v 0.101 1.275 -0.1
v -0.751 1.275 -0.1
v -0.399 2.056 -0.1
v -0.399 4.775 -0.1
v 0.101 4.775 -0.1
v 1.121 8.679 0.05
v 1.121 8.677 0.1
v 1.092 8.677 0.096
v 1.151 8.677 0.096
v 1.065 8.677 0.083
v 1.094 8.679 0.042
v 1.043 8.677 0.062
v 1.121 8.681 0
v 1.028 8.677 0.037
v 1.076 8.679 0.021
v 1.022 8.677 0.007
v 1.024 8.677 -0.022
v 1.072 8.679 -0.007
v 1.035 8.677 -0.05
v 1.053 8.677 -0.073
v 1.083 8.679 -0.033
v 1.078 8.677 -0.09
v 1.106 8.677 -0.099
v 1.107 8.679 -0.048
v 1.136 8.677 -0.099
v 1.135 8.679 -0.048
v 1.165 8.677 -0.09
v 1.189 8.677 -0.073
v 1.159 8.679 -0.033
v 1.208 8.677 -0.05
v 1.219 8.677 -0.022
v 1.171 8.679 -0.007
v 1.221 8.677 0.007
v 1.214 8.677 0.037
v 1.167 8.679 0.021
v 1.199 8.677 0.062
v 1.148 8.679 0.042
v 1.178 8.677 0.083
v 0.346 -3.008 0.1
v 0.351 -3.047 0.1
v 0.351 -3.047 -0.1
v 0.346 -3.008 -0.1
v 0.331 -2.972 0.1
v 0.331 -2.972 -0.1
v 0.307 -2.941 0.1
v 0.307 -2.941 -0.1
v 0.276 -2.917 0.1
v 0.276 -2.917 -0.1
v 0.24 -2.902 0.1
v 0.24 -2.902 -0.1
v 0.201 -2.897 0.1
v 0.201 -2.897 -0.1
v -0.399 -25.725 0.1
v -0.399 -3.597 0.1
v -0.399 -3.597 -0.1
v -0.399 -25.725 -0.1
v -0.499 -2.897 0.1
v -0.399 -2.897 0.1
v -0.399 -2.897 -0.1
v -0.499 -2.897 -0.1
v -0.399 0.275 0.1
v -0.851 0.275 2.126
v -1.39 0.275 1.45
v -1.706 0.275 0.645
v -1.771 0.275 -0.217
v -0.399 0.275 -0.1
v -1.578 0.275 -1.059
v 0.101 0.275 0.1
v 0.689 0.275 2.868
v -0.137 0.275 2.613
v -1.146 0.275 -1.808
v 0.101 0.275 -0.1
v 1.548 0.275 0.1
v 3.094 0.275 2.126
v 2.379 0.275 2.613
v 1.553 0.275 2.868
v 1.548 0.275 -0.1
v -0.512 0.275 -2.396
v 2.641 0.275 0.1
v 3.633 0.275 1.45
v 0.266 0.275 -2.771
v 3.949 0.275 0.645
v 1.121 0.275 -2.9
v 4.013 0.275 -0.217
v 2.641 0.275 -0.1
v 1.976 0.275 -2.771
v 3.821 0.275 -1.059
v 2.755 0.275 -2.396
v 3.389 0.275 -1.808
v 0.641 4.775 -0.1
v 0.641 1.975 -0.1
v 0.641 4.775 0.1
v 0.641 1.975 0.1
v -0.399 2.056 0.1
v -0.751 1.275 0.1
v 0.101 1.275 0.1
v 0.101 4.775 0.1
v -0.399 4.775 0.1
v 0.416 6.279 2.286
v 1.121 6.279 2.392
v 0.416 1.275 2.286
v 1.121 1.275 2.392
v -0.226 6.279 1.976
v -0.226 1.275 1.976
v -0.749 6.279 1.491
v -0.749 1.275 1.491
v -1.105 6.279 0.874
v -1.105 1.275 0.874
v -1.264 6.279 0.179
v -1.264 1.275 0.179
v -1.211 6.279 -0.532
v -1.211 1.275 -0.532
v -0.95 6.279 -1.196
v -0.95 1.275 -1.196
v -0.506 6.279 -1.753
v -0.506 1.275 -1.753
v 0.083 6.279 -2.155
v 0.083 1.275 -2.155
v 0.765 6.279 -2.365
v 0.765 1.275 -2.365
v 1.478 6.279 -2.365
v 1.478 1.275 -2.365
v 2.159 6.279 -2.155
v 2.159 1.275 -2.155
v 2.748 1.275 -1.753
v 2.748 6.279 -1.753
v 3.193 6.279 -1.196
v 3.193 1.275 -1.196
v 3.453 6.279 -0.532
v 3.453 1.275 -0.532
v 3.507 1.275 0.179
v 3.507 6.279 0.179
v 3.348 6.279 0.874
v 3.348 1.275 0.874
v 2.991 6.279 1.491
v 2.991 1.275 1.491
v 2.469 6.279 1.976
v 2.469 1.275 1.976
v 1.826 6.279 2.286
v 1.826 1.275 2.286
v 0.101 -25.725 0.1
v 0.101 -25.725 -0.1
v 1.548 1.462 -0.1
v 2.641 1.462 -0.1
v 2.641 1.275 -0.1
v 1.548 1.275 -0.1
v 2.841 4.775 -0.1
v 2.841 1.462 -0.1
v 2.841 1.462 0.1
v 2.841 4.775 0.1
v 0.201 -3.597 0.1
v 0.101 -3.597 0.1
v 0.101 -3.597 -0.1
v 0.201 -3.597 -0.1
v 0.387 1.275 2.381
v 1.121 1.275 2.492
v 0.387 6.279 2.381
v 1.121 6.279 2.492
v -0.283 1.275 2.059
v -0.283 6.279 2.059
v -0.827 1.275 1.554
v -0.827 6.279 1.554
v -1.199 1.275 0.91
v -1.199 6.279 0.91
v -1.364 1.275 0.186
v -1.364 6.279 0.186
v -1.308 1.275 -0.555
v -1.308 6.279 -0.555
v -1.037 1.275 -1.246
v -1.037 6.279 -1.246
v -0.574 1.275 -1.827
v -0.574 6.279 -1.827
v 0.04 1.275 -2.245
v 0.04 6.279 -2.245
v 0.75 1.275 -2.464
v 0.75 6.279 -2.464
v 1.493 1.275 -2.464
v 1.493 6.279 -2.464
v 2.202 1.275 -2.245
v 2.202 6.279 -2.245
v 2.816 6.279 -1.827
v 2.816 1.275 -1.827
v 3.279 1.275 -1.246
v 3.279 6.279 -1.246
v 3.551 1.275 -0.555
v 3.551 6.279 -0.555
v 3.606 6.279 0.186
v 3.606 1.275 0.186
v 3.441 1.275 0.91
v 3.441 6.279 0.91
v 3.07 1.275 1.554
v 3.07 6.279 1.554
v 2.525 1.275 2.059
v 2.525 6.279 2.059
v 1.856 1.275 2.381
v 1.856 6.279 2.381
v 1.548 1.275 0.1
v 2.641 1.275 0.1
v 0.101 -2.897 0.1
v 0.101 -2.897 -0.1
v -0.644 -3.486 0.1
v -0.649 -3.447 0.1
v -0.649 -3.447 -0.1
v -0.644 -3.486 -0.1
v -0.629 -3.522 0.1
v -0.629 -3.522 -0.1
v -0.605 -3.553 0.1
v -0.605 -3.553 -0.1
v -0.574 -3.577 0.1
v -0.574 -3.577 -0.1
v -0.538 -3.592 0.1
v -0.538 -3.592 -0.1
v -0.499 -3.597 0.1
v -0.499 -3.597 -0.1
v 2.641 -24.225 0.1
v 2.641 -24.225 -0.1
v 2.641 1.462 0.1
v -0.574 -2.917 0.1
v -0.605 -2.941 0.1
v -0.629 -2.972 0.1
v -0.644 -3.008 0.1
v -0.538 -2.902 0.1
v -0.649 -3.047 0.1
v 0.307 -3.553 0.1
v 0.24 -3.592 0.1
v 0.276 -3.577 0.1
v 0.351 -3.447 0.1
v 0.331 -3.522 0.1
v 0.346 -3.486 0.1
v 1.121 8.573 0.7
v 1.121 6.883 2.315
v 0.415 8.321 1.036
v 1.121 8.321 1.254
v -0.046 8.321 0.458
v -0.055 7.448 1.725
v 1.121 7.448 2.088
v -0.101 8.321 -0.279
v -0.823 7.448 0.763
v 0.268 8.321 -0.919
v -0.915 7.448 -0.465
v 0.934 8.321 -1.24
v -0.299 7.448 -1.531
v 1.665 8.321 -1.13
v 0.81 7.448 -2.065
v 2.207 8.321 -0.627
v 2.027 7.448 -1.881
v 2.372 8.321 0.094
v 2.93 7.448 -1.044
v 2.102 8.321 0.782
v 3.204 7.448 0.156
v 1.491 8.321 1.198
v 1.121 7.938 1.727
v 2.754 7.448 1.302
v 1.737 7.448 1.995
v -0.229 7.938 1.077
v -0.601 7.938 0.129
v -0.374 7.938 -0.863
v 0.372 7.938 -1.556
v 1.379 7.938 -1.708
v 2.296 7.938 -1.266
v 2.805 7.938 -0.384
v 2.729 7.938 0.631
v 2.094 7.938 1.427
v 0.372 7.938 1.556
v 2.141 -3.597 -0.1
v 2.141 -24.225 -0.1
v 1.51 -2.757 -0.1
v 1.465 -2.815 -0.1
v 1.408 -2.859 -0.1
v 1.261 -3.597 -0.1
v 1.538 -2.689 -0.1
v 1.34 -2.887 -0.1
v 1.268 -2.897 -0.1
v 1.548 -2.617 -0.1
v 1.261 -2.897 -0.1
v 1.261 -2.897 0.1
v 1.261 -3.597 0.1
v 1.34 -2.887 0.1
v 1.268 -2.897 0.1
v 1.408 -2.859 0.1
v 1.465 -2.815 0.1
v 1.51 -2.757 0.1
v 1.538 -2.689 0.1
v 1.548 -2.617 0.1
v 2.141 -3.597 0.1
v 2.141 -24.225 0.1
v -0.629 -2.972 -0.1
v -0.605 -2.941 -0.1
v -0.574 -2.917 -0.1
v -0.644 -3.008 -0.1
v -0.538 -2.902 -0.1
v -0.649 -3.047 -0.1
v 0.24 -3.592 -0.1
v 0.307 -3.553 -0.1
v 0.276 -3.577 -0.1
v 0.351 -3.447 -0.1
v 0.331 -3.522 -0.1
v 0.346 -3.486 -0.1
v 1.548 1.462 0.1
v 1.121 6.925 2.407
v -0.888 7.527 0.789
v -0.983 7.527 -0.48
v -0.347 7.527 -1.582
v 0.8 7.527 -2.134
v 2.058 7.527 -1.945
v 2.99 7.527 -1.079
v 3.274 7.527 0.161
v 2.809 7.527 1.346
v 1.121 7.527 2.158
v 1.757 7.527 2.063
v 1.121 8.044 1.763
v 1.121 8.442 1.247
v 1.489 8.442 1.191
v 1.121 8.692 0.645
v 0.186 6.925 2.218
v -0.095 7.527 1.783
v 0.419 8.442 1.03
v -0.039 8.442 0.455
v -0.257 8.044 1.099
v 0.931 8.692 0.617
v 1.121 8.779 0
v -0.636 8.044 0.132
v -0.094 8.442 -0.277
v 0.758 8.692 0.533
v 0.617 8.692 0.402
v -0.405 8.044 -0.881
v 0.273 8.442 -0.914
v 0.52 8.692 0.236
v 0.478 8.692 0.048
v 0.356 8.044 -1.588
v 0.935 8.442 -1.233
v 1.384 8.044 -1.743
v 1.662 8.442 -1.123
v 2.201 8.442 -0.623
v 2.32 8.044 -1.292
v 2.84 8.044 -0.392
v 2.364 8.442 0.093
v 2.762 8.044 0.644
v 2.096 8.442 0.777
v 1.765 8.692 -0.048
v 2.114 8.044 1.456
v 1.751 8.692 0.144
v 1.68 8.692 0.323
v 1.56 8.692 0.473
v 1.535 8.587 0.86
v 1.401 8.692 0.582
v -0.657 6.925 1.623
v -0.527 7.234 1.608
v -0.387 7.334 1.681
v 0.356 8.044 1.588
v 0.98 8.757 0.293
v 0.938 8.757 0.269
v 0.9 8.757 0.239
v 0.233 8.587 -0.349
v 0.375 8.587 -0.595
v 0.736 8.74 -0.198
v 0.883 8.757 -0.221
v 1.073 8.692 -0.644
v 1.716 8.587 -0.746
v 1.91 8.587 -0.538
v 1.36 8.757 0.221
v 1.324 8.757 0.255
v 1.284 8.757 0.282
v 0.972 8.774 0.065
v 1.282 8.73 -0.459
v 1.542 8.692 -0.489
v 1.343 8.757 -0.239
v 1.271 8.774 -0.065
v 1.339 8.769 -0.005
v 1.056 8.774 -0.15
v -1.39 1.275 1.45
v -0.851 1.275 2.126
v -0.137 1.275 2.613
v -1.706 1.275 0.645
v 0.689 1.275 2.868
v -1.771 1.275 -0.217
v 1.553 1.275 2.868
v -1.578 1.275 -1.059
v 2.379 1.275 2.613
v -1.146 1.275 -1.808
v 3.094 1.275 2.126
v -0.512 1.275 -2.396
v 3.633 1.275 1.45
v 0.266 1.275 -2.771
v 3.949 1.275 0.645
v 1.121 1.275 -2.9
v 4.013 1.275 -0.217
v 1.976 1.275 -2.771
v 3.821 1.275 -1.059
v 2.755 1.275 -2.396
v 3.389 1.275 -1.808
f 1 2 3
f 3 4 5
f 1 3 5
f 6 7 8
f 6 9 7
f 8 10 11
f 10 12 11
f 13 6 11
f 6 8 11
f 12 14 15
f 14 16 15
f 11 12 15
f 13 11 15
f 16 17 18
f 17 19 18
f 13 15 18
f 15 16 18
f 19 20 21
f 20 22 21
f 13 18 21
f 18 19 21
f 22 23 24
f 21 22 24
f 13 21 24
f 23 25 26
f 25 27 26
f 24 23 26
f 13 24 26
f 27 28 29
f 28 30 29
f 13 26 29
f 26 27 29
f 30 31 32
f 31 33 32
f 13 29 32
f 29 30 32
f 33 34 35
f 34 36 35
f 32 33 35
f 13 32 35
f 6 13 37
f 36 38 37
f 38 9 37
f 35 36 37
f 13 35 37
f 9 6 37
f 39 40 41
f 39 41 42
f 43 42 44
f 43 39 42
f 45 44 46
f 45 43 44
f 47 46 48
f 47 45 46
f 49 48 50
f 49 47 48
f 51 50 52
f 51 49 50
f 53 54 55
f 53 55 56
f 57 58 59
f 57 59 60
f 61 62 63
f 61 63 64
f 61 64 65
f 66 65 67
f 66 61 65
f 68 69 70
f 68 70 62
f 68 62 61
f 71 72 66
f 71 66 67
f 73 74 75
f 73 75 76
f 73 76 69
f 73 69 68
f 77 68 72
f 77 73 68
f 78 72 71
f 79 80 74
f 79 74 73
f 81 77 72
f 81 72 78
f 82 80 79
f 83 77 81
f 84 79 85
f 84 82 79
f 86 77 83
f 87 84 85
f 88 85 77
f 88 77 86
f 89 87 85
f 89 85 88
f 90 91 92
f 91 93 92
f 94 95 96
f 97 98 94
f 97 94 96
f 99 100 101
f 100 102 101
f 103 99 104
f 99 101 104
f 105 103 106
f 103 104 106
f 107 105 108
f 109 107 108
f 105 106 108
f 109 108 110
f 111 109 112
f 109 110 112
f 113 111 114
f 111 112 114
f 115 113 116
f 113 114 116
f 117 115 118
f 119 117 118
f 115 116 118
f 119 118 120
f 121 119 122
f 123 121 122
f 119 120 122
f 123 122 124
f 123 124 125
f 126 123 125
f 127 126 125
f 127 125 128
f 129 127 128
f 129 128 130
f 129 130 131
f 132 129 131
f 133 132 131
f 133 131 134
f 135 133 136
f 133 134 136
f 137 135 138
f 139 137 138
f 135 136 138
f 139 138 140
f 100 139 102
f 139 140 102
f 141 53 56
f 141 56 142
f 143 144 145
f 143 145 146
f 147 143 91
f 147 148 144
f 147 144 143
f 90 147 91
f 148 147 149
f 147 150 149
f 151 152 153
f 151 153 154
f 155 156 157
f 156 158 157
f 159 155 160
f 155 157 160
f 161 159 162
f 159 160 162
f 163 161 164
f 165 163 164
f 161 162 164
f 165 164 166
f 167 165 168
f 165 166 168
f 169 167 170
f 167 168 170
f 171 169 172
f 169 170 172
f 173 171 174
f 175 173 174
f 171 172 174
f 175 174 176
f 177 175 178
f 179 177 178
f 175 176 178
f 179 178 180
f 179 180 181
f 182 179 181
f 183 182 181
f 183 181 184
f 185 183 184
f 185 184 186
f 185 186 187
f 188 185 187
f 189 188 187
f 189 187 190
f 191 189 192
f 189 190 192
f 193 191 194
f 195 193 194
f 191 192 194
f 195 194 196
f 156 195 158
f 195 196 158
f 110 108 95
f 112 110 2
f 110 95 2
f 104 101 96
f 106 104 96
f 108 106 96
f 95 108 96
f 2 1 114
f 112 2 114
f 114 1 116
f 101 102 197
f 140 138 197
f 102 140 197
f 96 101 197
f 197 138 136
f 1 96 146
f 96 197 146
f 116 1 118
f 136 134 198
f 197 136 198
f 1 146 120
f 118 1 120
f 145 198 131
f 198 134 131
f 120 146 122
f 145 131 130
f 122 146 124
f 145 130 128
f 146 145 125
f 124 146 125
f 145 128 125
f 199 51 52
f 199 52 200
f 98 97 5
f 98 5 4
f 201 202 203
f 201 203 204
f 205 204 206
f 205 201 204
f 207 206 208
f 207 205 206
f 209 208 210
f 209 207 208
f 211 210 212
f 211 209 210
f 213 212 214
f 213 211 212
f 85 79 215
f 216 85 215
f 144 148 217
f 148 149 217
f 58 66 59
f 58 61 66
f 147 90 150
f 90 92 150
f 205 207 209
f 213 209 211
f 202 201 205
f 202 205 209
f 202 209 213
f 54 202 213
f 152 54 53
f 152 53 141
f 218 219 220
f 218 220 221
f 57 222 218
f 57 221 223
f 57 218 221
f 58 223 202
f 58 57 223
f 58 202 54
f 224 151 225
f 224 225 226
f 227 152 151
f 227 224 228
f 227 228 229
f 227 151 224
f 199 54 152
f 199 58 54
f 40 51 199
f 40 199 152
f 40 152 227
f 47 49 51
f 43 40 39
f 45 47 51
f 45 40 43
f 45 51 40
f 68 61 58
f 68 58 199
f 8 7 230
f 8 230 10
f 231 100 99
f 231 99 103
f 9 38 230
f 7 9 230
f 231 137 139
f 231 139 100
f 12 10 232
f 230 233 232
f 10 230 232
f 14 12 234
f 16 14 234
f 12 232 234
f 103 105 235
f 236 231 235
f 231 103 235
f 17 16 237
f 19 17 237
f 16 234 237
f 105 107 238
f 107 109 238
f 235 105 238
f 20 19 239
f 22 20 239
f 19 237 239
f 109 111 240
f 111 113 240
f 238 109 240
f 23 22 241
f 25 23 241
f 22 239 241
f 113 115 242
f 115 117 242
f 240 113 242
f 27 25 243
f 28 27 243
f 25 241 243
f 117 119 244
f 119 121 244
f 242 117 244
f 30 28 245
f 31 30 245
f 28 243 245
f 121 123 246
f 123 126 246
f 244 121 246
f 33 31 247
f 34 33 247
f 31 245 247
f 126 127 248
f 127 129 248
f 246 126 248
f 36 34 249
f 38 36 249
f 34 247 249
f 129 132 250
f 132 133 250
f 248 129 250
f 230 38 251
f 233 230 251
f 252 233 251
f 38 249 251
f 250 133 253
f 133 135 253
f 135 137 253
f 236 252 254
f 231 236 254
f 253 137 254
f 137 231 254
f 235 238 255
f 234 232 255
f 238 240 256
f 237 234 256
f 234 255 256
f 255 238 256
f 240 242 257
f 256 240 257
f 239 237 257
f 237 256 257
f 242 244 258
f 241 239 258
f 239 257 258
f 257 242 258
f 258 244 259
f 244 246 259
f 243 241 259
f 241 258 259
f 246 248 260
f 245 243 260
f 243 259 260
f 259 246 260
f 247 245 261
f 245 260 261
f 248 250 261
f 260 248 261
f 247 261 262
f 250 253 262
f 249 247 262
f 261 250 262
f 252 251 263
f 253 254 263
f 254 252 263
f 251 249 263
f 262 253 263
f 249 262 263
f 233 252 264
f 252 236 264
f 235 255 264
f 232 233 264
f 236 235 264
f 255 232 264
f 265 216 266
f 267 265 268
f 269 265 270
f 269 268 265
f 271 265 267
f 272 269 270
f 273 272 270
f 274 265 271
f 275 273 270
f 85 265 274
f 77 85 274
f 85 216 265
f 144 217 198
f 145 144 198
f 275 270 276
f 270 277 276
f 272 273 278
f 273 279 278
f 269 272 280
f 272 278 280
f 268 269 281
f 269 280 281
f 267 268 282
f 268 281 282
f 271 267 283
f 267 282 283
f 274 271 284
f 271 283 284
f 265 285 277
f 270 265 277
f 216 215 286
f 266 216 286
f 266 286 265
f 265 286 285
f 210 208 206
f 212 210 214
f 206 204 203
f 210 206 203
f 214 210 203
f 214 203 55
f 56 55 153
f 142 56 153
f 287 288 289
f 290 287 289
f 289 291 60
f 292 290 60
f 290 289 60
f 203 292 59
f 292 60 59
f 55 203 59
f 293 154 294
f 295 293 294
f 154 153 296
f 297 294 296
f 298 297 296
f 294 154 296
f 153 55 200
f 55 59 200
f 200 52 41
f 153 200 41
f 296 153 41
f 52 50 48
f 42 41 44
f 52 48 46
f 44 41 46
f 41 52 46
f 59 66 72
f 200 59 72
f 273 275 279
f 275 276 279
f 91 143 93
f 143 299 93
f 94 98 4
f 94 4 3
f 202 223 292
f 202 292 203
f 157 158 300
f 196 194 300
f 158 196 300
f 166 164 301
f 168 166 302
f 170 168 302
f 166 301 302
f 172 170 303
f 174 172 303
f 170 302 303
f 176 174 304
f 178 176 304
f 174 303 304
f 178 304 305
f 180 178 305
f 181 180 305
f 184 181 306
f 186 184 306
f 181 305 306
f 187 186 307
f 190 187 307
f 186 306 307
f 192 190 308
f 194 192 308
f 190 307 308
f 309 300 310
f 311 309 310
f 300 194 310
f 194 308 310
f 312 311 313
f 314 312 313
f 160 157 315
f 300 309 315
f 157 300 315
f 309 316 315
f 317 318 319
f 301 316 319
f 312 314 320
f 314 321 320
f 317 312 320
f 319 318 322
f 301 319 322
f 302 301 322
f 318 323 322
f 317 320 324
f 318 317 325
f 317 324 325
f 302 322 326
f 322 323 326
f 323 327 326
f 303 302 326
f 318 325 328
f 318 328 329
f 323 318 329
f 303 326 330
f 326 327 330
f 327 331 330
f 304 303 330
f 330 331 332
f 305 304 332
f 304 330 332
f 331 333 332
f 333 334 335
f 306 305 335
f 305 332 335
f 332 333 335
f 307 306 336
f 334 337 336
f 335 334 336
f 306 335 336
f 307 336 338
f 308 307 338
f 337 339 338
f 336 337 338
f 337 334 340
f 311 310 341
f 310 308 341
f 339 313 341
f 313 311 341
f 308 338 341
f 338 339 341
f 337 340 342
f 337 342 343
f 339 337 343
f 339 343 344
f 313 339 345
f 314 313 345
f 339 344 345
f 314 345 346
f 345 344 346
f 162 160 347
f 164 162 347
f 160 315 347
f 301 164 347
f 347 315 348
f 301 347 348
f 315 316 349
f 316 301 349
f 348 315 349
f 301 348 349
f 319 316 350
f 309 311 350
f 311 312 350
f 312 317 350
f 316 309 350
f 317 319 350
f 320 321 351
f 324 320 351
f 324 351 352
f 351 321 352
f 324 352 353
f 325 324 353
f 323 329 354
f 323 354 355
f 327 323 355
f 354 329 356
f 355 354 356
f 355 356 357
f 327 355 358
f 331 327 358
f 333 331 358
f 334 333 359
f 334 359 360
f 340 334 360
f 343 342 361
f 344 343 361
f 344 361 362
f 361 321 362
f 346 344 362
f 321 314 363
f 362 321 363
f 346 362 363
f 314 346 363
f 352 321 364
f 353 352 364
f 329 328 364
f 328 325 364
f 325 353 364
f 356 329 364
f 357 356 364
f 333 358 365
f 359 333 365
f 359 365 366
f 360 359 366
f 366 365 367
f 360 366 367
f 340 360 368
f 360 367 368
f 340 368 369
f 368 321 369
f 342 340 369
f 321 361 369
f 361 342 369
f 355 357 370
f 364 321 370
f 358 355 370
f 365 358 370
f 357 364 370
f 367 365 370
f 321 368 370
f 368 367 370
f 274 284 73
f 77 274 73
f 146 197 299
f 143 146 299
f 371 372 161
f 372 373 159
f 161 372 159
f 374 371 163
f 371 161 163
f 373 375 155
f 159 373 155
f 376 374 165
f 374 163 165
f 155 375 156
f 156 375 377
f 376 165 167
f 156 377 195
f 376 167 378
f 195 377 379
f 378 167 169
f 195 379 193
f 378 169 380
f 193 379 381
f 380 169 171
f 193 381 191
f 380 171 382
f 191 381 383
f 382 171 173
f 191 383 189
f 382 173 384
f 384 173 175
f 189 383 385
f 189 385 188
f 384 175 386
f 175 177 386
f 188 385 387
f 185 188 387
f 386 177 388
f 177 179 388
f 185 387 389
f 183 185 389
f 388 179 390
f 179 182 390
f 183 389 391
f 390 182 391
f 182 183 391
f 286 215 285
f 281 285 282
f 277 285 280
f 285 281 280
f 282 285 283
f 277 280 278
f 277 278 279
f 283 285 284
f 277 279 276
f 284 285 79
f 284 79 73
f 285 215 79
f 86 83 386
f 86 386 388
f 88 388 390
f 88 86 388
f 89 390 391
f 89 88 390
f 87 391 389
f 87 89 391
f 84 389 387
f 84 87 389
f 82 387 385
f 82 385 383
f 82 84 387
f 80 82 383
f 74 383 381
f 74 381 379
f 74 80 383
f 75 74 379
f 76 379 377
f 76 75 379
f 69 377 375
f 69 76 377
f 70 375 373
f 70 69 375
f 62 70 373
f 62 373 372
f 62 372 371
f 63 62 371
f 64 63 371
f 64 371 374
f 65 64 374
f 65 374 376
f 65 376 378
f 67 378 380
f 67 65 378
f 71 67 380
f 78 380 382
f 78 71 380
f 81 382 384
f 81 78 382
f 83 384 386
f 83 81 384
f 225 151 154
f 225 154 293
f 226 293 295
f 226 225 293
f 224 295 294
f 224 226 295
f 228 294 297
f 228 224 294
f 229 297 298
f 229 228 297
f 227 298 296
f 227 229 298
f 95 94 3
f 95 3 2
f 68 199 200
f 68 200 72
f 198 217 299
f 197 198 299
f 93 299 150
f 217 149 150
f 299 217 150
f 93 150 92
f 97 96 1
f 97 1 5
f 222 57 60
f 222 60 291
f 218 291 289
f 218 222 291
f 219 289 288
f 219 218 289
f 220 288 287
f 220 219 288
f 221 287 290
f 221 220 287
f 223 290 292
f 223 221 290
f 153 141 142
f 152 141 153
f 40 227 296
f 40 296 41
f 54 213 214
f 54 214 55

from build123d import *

# Parameters (mm, degrees)
SALIENTE_EXTRUIR1_DEPTH   = 0.1
SALIENTE_EXTRUIR1_2_DEPTH = 0.1
CROQUIS7_R                = 2.9
SALIENTE_EXTRUIR2_DEPTH   = 1


with BuildPart() as part:
    # Croquis1 → Saliente-Extruir1 (new, symmetric)
    with BuildSketch(Plane.XY):
        with BuildLine():
            Line((2.141229394, -3.596955899), (1.261229394, -3.596955899))
            Line((1.261229394, -3.596955899), (1.261229394, -2.896955899))
            Line((1.261229394, -2.896955899), (1.267504118, -2.896955899))
            ThreePointArc((1.267504118, -2.896955899), (1.465494017, -2.814945798), (1.547504118, -2.616955899))
            Line((1.547504118, -2.616955899), (1.547504118, 0.274513326))
            Line((1.547504118, 0.274513326), (1.547504118, 1.461848277))
            Line((1.547504118, 1.461848277), (0.641229394, 1.974513326))
            Line((0.641229394, 1.974513326), (0.641229394, 4.774513326))
            Line((0.641229394, 4.774513326), (2.841229394, 4.774513326))
            Line((2.841229394, 4.774513326), (2.841229394, 1.461848277))
            Line((2.841229394, 1.461848277), (2.641229394, 1.461848277))
            Line((2.641229394, 1.461848277), (2.641229394, 0.274513326))
            Line((2.641229394, 0.274513326), (2.641229394, -24.225486674))
            Line((2.641229394, -24.225486674), (2.141229394, -24.225486674))
            Line((2.141229394, -24.225486674), (2.141229394, -3.596955899))
        make_face()
    extrude(amount=SALIENTE_EXTRUIR1_DEPTH, both=True)



with BuildPart() as body_2:
    # Croquis1 → Saliente-Extruir1 2 (new, symmetric)
    with BuildSketch(Plane.XY):
        with BuildLine():
            Line((-0.398770606, 0.274513326), (-0.398770606, -2.896955899))
            Line((-0.398770606, -2.896955899), (-0.498770606, -2.896955899))
            ThreePointArc((-0.498770606, -2.896955899), (-0.604836624, -2.940889882), (-0.648770606, -3.046955899))
            Line((-0.648770606, -3.046955899), (-0.648770606, -3.446955899))
            ThreePointArc((-0.648770606, -3.446955899), (-0.604836624, -3.553021917), (-0.498770606, -3.596955899))
            Line((-0.498770606, -3.596955899), (-0.398770606, -3.596955899))
            Line((-0.398770606, -3.596955899), (-0.398770606, -25.725486674))
            Line((-0.398770606, -25.725486674), (0.101229394, -25.725486674))
            Line((0.101229394, -25.725486674), (0.101229394, -3.596955899))
            Line((0.101229394, -3.596955899), (0.201229394, -3.596955899))
            ThreePointArc((0.201229394, -3.596955899), (0.307295411, -3.553021917), (0.351229394, -3.446955899))
            Line((0.351229394, -3.446955899), (0.351229394, -3.046955899))
            ThreePointArc((0.351229394, -3.046955899), (0.307295411, -2.940889882), (0.201229394, -2.896955899))
            Line((0.201229394, -2.896955899), (0.101229394, -2.896955899))
            Line((0.101229394, -2.896955899), (0.101229394, 0.274513326))
            Line((0.101229394, 0.274513326), (0.101229394, 4.774513326))
            Line((0.101229394, 4.774513326), (-0.398770606, 4.774513326))
            Line((-0.398770606, 4.774513326), (-0.398770606, 2.056181546))
            Line((-0.398770606, 2.056181546), (-0.898770606, 0.945997951))
            Line((-0.898770606, 0.945997951), (-0.898770606, 0.274513326))
            Line((-0.898770606, 0.274513326), (-0.398770606, 0.274513326))
        make_face()
    extrude(amount=SALIENTE_EXTRUIR1_2_DEPTH, both=True)


with BuildPart() as part_1:
    add(part.part)

    add(body_2.part)  # Saliente-Extruir2 merges body 2
    # Croquis7 → Saliente-Extruir2 (add)
    with BuildSketch(Plane(origin=(0, 0.274513326, 0), x_dir=(-1, 0, 0), z_dir=(0, -1, 0))):
        with Locations(Location((-1.121229394, 0, 0), (0, 0, 90))):
            Circle(CROQUIS7_R)
    extrude(amount=-SALIENTE_EXTRUIR2_DEPTH)

    # Croquis9 → Revolución2 (revolve)
    with BuildSketch(Plane.XY, mode=Mode.PRIVATE) as revoluci_n2_sk:
        with BuildLine():
            Line((-1.370805616, 1.274513326), (-1.370805616, 6.27937105))
            ThreePointArc((-1.370805616, 6.27937105), (-0.641386379, 8.044319707), (1.121229394, 8.779358362))
            Line((1.121229394, 8.779358362), (1.121229394, 8.681444496))
            Line((1.121229394, 8.681444496), (1.021229394, 8.676941396))
            ThreePointArc((1.021229394, 8.676941396), (-0.605613383, 7.937816712), (-1.270805616, 6.27937105))
            Line((-1.270805616, 6.27937105), (-1.270805616, 1.274513326))
            Line((-1.270805616, 1.274513326), (-1.370805616, 1.274513326))
        make_face()
    revolve(revoluci_n2_sk.sketch.rotate(Axis((1.121229394, 8.681444496, 0), (0, -1, 0)), 270), axis=Axis((1.121229394, 8.681444496, 0), (0, -1, 0)))


solid = part_1.part
